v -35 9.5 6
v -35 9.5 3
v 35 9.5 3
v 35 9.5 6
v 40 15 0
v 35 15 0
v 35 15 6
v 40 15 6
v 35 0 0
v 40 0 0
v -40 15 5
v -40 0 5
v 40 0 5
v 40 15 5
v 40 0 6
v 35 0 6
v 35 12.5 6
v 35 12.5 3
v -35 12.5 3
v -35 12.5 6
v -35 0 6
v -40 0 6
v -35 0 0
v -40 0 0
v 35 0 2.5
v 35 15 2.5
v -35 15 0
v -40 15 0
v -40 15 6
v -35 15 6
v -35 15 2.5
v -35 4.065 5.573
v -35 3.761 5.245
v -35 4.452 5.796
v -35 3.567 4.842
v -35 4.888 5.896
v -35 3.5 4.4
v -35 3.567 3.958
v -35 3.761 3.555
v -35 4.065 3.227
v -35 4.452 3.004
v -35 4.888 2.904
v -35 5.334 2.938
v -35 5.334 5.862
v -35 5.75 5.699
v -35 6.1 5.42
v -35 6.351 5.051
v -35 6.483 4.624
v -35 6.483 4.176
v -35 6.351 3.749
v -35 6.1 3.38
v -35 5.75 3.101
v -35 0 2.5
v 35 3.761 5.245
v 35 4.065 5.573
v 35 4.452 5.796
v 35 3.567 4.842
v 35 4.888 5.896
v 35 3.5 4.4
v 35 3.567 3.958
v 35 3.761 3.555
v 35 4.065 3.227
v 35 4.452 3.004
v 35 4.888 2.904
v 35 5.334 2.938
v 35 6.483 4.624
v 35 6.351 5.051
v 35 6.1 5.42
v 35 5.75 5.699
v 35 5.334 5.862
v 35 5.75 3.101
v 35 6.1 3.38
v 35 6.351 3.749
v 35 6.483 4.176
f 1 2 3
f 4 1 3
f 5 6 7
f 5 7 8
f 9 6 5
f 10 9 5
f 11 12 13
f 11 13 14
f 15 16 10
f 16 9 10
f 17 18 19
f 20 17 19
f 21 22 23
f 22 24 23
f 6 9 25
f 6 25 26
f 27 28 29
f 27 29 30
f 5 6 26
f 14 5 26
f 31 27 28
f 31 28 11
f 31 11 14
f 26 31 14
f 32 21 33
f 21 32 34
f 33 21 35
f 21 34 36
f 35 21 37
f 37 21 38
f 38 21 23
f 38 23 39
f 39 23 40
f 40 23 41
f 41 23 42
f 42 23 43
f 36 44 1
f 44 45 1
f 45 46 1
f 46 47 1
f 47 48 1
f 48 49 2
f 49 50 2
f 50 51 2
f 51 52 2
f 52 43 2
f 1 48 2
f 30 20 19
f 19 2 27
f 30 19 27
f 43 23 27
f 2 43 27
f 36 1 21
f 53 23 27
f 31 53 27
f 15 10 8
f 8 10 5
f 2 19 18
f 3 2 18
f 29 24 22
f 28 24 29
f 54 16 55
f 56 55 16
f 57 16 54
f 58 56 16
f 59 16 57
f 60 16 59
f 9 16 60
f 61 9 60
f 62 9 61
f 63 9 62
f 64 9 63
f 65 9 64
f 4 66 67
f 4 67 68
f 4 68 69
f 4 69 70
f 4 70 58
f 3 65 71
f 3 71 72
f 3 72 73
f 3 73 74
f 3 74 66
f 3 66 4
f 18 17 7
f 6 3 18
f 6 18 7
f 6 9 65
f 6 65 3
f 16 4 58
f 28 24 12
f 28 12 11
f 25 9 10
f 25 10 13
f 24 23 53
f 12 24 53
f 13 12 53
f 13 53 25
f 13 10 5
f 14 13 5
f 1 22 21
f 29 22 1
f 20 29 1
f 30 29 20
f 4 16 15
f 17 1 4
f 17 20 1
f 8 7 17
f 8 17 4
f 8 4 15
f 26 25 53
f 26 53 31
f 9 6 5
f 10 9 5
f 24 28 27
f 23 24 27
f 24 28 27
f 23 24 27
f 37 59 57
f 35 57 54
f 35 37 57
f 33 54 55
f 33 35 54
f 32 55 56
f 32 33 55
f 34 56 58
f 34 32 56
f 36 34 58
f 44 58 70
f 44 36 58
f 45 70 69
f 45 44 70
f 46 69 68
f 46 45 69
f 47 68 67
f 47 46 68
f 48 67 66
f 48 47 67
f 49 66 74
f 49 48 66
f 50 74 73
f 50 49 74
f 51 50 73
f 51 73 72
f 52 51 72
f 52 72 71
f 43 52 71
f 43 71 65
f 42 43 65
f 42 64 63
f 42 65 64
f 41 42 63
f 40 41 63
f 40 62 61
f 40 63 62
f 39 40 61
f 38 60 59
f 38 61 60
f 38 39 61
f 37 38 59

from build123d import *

# Parameters (mm, degrees)
F0_W      = 5
F0_H      = 15
F1_DEPTH  = 3
F2_W      = 72.5
F2_H      = 3
F2_W_2    = 2.5
F3_DEPTH  = 3
F4_R      = 1.5
F5_DEPTH  = 75
F6_DEPTH  = 3
F7_DEPTH  = 3
F8_DEPTH  = 5
F9_W      = 15
F9_H      = 2.5
F10_DEPTH = 70


with BuildPart() as f1:
    # F0 (on Top) → F1 (new body)
    with BuildSketch(Plane.XY):
        with Locations((-37.5, 7.5)):
            Rectangle(F0_W, F0_H)
    extrude(amount=F1_DEPTH)

    # F6 (add, through all): a face of the model
    f6_faces = [f1.faces().sort_by_distance(p)[0] for p in [
        (-37.5, 7.5, 3),
    ]]


with BuildPart() as f1b:
    # F0 (on Top) → F1, piece 2 (new body)
    with BuildSketch(Plane.XY):
        with Locations((37.5, 7.5)):
            Rectangle(F0_W, F0_H)
    extrude(amount=F1_DEPTH)


with BuildPart() as f3:
    # F2 (on face) → F3 (new body)
    with BuildSketch(Plane.XY.offset(3)):
        with Locations((-1.25, 11)):
            Rectangle(F2_W, F2_H)
        with Locations((36.25, 11)):
            Rectangle(F2_W_2, F2_H)
    extrude(amount=F3_DEPTH)


with BuildPart() as f5:
    # F4 (on face) → F5 (new body)
    with BuildSketch(Plane(origin=(-37.5, 0, 0), x_dir=(0, -1, 0), z_dir=(-1, 0, 0))):
        with Locations((-5, 4.4)):
            Circle(F4_R)
    extrude(amount=-F5_DEPTH)


with BuildPart() as f1_1:
    add(f1.part)

    add(f3.part)  # F6 merges F3

    add(f5.part)  # F6 merges F5
    extrude(f6_faces, amount=F6_DEPTH)

    # F7 (add, through all): a face of the model
    f7_faces = [f1b.part.faces().sort_by_distance(p)[0] for p in [
        (37.5, 7.5, 3),
    ]]

    add(f1b.part)  # F7 merges F1b
    extrude(f7_faces, amount=F7_DEPTH)


with BuildPart() as f8:
    # F0 (on Top) → F8 (new body)
    with BuildSketch(Plane.XY):
        with Locations((-37.5, 7.5)):
            Rectangle(F0_W, F0_H)
    extrude(amount=F8_DEPTH)



with BuildPart() as f8b:
    # F0 (on Top) → F8, piece 2 (new body)
    with BuildSketch(Plane.XY):
        with Locations((37.5, 7.5)):
            Rectangle(F0_W, F0_H)
    extrude(amount=F8_DEPTH)


with BuildPart() as f8_1:
    add(f8.part)

    add(f8b.part)  # F10 merges F8b
    # F9 (on face) → F10 (join, through all)
    with BuildSketch(Plane.YZ.offset(-35)):
        with Locations((7.5, 3.75)):
            Rectangle(F9_W, F9_H)
    extrude(amount=F10_DEPTH)


solid = Compound([f1_1.part, f8_1.part])
